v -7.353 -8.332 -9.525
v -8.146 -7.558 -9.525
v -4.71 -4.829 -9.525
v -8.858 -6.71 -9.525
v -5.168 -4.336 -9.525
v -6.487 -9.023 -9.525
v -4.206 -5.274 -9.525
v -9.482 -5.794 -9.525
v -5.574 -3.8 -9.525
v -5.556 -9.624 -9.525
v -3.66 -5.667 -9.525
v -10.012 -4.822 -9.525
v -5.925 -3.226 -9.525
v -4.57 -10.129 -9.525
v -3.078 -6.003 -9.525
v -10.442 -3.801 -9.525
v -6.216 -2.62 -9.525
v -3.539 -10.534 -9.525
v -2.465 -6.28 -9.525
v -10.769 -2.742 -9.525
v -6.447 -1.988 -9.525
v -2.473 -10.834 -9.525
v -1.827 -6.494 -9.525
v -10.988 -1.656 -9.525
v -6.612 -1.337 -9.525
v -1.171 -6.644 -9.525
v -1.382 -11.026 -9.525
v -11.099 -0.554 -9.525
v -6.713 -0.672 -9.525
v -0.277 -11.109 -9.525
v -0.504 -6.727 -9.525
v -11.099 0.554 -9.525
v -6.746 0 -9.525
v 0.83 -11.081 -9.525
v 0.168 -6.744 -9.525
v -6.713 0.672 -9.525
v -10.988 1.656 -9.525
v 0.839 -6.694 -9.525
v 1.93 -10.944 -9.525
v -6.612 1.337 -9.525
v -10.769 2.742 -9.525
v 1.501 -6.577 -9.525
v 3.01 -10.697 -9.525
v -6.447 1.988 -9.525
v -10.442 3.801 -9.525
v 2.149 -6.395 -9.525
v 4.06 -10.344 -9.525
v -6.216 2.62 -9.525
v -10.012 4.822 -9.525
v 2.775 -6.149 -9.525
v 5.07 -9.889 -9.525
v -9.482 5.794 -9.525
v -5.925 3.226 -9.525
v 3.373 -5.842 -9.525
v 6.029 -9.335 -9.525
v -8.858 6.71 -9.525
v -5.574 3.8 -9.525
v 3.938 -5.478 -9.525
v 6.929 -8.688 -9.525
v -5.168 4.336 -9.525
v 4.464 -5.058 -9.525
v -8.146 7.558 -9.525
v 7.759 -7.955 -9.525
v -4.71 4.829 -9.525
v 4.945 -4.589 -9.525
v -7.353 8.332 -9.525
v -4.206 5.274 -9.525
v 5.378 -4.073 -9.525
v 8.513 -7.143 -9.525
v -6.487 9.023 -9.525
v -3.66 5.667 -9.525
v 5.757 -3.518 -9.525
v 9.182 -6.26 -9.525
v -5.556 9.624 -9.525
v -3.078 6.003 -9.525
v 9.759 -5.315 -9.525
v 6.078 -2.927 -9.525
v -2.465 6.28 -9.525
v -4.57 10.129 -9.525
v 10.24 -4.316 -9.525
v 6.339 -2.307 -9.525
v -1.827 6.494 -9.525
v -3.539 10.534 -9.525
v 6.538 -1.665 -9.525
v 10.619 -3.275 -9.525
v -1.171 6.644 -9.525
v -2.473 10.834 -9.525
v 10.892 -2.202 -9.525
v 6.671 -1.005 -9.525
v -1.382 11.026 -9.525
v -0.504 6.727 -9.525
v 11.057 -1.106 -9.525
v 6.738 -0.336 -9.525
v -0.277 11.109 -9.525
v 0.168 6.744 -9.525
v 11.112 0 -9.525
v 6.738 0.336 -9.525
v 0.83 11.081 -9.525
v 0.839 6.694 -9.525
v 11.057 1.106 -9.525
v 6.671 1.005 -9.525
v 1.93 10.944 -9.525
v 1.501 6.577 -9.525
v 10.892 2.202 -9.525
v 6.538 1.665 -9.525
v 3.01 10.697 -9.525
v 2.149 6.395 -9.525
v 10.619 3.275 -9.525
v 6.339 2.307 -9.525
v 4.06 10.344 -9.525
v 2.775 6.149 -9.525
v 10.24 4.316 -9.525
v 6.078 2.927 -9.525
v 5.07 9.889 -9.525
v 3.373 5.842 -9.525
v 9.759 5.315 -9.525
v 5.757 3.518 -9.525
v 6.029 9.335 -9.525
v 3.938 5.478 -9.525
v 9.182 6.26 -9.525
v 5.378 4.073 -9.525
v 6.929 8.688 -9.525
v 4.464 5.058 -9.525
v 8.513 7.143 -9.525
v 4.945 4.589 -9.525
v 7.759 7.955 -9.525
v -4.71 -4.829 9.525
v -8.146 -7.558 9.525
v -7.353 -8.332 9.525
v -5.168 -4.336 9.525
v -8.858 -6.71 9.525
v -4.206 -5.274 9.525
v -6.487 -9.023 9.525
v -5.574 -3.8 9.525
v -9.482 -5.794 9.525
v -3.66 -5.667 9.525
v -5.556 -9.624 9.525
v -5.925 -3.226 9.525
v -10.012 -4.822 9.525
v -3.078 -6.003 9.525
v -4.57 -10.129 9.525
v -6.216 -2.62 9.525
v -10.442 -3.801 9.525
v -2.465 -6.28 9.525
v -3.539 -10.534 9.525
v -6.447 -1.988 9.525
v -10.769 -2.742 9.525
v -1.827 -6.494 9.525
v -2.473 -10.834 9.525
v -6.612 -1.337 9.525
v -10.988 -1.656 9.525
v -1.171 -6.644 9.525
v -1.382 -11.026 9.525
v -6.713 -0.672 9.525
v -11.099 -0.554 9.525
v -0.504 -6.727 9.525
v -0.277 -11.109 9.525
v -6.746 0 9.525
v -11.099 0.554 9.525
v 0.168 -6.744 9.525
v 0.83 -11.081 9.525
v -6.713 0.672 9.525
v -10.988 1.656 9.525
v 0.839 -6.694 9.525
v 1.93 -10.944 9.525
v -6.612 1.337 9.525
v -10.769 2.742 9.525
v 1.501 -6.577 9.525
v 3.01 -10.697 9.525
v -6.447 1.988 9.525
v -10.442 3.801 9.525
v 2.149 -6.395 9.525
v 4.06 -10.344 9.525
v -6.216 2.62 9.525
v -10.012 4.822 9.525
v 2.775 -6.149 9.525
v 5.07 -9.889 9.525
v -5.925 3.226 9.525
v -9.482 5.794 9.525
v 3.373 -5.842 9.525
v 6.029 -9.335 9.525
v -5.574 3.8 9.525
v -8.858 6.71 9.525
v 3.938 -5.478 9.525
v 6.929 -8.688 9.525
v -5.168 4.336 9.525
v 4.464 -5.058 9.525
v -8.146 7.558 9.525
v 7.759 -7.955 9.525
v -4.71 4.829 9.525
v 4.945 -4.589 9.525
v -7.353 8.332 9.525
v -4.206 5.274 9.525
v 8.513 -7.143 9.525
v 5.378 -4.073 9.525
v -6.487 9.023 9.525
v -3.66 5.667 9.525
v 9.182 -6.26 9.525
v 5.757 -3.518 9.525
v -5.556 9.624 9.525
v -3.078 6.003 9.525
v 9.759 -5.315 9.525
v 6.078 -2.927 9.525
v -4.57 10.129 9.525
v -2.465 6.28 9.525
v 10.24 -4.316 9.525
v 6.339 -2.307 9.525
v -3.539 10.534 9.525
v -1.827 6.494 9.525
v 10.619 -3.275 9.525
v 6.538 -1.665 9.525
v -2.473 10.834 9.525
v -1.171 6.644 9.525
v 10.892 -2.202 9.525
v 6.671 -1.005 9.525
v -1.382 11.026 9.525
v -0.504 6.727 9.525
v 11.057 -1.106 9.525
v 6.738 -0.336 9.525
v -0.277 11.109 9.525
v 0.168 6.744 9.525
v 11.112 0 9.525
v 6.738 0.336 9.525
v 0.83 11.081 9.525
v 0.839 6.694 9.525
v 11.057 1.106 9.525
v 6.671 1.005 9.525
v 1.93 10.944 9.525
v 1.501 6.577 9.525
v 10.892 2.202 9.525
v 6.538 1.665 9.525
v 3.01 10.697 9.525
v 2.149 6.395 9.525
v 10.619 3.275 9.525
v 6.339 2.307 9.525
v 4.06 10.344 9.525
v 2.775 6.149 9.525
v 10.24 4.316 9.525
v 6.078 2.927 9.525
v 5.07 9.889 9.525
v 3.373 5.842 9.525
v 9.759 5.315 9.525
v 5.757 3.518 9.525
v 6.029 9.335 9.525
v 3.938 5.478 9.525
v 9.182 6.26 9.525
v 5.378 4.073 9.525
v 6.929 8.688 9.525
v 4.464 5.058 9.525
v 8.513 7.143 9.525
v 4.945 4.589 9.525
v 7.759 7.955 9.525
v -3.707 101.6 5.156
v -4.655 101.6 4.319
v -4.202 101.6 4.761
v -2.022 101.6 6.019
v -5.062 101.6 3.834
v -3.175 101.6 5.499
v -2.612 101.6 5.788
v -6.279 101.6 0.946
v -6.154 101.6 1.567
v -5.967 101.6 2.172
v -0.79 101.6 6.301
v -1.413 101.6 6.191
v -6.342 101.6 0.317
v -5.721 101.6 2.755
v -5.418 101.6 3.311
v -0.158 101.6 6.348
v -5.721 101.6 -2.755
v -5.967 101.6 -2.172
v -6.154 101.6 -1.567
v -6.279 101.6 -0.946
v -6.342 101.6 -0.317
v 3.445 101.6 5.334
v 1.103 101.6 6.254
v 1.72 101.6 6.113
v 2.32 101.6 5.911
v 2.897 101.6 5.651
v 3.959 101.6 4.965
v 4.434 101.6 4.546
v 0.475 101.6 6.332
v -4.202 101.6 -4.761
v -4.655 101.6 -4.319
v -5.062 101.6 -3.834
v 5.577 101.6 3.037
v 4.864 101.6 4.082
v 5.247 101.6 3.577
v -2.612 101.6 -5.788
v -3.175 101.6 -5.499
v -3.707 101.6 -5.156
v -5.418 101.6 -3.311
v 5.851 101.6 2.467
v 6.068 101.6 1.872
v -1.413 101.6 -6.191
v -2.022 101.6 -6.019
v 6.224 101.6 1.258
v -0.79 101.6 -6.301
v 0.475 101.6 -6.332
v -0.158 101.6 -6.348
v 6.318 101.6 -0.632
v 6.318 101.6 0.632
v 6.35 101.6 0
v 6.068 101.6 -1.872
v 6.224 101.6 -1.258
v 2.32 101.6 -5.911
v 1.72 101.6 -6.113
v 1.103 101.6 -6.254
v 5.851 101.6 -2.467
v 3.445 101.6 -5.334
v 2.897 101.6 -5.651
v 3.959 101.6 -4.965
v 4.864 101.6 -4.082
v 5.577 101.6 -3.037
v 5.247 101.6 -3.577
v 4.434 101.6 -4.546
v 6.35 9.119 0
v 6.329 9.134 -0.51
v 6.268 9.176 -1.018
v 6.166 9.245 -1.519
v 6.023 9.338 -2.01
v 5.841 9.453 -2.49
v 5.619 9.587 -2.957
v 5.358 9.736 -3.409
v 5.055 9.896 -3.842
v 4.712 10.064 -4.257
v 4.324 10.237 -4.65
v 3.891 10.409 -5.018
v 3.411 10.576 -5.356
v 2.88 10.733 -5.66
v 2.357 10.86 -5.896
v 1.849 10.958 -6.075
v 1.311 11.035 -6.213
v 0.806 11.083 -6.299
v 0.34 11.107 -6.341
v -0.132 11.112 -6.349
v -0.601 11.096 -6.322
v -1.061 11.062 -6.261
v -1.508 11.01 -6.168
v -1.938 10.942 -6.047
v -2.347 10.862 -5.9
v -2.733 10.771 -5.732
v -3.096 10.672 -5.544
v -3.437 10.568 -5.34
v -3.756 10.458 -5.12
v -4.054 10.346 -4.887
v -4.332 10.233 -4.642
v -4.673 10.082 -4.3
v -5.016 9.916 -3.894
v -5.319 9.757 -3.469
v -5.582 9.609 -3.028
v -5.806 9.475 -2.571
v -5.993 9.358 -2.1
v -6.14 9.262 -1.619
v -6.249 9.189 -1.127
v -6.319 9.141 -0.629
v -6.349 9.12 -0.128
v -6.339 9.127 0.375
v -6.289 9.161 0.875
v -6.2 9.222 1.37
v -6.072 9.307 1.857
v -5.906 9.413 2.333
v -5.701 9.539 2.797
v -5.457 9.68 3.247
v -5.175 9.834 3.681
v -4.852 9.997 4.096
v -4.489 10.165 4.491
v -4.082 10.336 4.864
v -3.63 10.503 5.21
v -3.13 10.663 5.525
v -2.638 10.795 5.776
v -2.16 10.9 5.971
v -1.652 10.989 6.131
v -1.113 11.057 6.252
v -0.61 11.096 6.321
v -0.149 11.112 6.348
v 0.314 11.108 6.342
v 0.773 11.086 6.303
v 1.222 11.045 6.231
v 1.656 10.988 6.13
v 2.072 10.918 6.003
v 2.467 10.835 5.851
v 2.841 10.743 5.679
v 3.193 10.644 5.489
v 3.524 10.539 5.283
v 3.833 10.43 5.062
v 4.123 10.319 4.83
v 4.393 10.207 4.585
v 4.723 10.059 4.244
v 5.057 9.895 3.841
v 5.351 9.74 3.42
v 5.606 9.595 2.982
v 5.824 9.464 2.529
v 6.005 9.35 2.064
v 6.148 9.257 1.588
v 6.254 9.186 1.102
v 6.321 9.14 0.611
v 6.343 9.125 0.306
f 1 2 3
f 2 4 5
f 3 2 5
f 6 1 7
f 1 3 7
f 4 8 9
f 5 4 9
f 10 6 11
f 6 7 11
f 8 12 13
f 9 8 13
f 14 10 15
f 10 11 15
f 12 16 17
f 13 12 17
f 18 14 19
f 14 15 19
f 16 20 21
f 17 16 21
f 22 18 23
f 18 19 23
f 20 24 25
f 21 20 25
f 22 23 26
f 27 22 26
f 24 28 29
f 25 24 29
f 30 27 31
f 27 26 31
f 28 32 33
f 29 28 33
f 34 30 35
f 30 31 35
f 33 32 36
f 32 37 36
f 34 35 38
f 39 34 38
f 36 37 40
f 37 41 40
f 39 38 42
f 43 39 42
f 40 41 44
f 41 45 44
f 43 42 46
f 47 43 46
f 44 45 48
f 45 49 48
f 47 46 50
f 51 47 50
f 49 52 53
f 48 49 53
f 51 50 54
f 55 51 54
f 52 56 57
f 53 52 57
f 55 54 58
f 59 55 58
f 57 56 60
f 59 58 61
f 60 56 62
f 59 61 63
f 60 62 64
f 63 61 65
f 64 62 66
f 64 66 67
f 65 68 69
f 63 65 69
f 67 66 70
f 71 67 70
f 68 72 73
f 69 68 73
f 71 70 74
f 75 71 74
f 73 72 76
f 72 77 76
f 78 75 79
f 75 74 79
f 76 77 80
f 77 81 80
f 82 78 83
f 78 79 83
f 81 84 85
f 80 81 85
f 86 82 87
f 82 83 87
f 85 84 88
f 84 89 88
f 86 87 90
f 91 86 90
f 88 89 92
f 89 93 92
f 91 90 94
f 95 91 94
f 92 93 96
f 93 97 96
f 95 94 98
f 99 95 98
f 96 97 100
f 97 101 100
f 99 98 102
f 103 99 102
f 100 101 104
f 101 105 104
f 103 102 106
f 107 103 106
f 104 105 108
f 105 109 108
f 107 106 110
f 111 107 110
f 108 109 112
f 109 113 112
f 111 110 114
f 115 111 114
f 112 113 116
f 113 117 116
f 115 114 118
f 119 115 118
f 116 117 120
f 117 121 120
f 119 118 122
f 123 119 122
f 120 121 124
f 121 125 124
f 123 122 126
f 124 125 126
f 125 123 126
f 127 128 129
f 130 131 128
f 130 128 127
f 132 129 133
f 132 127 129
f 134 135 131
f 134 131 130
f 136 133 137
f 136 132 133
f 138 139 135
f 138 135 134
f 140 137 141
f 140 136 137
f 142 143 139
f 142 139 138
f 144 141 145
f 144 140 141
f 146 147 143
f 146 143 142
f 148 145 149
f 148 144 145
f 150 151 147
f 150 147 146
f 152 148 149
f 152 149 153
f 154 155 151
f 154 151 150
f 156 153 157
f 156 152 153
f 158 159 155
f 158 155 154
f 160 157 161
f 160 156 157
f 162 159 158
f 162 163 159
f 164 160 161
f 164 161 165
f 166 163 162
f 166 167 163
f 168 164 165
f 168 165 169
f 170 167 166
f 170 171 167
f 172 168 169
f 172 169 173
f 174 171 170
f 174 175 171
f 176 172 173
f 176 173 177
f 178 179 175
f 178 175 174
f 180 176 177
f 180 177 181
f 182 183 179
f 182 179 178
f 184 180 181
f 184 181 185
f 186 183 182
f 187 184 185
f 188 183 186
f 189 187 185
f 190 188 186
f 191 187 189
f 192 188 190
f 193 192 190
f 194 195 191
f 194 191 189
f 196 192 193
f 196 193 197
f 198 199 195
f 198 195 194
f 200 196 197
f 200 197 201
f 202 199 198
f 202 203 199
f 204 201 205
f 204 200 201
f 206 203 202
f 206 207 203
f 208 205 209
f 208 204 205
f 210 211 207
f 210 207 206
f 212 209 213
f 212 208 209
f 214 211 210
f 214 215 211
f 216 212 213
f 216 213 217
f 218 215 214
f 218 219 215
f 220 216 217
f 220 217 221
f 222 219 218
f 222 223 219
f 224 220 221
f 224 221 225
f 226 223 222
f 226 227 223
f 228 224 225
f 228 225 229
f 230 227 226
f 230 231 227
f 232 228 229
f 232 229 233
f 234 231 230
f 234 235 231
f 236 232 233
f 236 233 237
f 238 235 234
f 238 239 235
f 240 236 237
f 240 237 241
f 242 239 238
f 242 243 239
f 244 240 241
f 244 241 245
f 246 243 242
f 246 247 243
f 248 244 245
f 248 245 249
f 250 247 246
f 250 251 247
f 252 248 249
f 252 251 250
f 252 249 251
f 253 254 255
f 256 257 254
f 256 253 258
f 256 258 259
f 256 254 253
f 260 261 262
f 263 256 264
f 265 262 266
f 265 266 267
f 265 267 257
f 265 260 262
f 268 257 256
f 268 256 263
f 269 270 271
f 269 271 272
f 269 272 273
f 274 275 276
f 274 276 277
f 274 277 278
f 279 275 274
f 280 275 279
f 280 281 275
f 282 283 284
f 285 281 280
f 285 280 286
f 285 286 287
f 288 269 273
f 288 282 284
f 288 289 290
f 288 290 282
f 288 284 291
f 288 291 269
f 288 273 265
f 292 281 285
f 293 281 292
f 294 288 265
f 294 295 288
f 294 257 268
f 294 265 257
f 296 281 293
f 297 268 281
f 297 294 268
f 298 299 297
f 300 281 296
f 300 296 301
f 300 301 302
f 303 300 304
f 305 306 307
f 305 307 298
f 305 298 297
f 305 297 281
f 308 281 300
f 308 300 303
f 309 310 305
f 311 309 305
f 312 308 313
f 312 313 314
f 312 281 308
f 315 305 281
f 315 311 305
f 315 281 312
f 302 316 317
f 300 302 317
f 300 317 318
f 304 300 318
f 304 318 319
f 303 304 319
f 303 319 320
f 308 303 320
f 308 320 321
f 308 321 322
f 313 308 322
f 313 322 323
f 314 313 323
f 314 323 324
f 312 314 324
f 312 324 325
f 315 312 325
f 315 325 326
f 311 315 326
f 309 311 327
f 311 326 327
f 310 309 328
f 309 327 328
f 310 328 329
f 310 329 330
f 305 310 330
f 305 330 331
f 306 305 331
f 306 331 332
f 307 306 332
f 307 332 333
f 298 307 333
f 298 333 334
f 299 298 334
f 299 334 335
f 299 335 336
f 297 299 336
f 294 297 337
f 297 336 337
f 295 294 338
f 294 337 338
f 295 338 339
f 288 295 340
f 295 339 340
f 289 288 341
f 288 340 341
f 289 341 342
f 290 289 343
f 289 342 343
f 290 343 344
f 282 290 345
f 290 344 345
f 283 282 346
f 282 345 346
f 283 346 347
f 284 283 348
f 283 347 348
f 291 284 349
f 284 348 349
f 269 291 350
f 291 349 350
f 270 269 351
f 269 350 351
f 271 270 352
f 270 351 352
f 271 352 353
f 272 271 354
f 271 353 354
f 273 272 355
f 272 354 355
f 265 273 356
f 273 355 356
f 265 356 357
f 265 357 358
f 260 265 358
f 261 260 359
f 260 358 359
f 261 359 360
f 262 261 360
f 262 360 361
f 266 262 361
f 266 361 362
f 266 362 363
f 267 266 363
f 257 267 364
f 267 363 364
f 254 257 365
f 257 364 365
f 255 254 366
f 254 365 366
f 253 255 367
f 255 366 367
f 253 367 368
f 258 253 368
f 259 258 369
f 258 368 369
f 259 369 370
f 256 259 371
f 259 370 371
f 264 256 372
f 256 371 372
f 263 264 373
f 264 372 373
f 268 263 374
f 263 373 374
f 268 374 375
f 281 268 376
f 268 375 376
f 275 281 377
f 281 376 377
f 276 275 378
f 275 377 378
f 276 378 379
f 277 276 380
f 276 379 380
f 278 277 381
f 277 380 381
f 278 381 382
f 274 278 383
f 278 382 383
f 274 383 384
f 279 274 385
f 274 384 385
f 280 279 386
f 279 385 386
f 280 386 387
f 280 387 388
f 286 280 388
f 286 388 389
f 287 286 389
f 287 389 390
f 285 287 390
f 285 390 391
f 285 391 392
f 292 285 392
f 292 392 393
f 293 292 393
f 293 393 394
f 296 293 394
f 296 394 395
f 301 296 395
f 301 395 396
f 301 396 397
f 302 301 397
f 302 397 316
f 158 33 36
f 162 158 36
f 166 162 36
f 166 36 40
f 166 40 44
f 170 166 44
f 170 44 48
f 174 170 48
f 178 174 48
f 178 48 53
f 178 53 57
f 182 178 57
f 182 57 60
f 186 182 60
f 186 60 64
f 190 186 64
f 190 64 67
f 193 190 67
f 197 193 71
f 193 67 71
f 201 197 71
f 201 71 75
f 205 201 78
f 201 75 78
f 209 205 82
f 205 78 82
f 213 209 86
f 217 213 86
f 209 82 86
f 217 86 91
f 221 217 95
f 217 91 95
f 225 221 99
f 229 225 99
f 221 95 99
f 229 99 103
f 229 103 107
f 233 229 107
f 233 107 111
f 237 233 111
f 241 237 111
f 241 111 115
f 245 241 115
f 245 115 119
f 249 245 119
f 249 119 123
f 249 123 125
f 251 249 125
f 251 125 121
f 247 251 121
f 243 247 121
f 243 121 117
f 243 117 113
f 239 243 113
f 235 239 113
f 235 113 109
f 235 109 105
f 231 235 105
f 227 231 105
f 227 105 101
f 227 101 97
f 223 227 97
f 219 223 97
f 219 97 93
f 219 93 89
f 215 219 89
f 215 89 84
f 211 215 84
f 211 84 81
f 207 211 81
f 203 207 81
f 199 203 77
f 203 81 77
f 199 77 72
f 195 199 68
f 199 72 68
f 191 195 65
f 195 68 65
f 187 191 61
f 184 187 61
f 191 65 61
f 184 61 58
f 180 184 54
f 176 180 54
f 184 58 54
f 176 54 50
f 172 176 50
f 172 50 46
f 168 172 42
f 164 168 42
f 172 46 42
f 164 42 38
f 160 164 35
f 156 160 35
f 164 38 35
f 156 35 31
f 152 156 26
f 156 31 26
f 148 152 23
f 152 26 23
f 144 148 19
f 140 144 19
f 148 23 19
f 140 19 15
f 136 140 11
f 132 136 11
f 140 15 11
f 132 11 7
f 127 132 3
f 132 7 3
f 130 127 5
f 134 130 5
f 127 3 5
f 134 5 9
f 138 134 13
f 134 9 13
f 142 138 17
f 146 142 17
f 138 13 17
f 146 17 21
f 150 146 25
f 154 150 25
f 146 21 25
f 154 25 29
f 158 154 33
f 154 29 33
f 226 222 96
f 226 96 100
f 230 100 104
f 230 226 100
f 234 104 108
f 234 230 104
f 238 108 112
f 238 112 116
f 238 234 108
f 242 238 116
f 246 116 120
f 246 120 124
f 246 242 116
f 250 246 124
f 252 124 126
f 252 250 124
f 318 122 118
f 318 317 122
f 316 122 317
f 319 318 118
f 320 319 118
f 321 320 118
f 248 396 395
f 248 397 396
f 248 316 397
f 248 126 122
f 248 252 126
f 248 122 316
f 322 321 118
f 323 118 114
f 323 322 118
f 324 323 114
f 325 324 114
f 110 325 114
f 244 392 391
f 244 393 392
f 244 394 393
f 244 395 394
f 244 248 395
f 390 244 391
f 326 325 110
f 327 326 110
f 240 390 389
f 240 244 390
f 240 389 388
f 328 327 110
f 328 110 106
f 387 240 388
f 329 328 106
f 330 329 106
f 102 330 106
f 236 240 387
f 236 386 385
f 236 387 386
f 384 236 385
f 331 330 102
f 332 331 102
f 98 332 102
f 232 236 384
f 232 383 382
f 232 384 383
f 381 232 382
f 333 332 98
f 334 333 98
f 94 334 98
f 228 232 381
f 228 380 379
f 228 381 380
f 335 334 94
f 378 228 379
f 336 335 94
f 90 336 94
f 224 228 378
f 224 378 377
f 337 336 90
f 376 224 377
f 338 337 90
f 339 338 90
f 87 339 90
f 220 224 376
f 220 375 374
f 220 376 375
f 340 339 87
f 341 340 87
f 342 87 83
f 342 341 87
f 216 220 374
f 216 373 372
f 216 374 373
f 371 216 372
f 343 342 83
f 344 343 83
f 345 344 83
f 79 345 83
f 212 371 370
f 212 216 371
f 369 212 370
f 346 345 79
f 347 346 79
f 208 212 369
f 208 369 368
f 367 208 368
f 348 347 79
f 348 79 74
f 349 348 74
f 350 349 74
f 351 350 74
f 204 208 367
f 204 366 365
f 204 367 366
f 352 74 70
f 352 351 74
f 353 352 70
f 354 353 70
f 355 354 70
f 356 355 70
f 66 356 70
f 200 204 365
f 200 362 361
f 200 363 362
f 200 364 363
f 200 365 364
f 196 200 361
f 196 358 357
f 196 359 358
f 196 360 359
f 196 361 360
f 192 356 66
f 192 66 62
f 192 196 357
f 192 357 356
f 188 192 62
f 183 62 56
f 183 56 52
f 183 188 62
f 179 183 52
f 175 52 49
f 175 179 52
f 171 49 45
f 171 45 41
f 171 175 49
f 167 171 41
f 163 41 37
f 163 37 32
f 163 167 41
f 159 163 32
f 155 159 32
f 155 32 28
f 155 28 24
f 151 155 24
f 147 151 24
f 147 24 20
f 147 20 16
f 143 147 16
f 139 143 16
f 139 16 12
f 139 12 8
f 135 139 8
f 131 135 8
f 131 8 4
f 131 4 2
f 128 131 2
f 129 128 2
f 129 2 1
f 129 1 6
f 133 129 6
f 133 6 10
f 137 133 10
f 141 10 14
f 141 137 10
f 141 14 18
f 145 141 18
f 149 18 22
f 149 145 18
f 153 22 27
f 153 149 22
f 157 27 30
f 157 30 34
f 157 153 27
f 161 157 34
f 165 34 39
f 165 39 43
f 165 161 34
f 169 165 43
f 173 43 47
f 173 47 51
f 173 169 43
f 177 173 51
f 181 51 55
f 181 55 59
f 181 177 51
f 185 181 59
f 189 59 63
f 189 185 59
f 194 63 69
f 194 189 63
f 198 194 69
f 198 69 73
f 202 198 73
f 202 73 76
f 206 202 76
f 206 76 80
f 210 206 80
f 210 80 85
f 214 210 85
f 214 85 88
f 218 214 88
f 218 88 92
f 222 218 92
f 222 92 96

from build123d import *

# Parameters (mm, degrees)
BOSS_EXTRUDE1_DEPTH         = 9.525
BOSS_EXTRUDE1_DEPTH_BACK    = 9.525
SKETCH1_R                   = 11.1125
SKETCH2_R                   = 6.35
BOSS_EXTRUDE2_DEPTH         = 101.6
F_1_2_CLEARANCE_HOLE1_D     = 13.49248
F_1_2_CLEARANCE_HOLE1_DEPTH = 63.5
F_1_2_CLEARANCE_HOLE1_TIP   = 4.053549943


with BuildPart() as part:
    # Sketch1 → Boss-Extrude1 (new, two sides: drawn at the far end of the back side and taken through both)
    with BuildSketch(Plane.XY.offset(-BOSS_EXTRUDE1_DEPTH_BACK)):
        Circle(SKETCH1_R)
    extrude(amount=BOSS_EXTRUDE1_DEPTH + BOSS_EXTRUDE1_DEPTH_BACK)

    # Sketch2 → Boss-Extrude2 (add)
    with BuildSketch(Plane(origin=(0, 0, 0), x_dir=(1, 0, 0), z_dir=(0, 1, 0))):
        Circle(SKETCH2_R)
    extrude(amount=BOSS_EXTRUDE2_DEPTH)

    # 1/2 Clearance Hole1
    with Locations(Plane.XY.offset(9.525)):
        with Locations((0, 0)):
            Hole(F_1_2_CLEARANCE_HOLE1_D / 2, depth=F_1_2_CLEARANCE_HOLE1_DEPTH)
            with Locations((0, 0, -(F_1_2_CLEARANCE_HOLE1_DEPTH + F_1_2_CLEARANCE_HOLE1_TIP / 2))):  # 118° drill point
                Cone(0, F_1_2_CLEARANCE_HOLE1_D / 2, F_1_2_CLEARANCE_HOLE1_TIP, mode=Mode.SUBTRACT)


solid = part.part
